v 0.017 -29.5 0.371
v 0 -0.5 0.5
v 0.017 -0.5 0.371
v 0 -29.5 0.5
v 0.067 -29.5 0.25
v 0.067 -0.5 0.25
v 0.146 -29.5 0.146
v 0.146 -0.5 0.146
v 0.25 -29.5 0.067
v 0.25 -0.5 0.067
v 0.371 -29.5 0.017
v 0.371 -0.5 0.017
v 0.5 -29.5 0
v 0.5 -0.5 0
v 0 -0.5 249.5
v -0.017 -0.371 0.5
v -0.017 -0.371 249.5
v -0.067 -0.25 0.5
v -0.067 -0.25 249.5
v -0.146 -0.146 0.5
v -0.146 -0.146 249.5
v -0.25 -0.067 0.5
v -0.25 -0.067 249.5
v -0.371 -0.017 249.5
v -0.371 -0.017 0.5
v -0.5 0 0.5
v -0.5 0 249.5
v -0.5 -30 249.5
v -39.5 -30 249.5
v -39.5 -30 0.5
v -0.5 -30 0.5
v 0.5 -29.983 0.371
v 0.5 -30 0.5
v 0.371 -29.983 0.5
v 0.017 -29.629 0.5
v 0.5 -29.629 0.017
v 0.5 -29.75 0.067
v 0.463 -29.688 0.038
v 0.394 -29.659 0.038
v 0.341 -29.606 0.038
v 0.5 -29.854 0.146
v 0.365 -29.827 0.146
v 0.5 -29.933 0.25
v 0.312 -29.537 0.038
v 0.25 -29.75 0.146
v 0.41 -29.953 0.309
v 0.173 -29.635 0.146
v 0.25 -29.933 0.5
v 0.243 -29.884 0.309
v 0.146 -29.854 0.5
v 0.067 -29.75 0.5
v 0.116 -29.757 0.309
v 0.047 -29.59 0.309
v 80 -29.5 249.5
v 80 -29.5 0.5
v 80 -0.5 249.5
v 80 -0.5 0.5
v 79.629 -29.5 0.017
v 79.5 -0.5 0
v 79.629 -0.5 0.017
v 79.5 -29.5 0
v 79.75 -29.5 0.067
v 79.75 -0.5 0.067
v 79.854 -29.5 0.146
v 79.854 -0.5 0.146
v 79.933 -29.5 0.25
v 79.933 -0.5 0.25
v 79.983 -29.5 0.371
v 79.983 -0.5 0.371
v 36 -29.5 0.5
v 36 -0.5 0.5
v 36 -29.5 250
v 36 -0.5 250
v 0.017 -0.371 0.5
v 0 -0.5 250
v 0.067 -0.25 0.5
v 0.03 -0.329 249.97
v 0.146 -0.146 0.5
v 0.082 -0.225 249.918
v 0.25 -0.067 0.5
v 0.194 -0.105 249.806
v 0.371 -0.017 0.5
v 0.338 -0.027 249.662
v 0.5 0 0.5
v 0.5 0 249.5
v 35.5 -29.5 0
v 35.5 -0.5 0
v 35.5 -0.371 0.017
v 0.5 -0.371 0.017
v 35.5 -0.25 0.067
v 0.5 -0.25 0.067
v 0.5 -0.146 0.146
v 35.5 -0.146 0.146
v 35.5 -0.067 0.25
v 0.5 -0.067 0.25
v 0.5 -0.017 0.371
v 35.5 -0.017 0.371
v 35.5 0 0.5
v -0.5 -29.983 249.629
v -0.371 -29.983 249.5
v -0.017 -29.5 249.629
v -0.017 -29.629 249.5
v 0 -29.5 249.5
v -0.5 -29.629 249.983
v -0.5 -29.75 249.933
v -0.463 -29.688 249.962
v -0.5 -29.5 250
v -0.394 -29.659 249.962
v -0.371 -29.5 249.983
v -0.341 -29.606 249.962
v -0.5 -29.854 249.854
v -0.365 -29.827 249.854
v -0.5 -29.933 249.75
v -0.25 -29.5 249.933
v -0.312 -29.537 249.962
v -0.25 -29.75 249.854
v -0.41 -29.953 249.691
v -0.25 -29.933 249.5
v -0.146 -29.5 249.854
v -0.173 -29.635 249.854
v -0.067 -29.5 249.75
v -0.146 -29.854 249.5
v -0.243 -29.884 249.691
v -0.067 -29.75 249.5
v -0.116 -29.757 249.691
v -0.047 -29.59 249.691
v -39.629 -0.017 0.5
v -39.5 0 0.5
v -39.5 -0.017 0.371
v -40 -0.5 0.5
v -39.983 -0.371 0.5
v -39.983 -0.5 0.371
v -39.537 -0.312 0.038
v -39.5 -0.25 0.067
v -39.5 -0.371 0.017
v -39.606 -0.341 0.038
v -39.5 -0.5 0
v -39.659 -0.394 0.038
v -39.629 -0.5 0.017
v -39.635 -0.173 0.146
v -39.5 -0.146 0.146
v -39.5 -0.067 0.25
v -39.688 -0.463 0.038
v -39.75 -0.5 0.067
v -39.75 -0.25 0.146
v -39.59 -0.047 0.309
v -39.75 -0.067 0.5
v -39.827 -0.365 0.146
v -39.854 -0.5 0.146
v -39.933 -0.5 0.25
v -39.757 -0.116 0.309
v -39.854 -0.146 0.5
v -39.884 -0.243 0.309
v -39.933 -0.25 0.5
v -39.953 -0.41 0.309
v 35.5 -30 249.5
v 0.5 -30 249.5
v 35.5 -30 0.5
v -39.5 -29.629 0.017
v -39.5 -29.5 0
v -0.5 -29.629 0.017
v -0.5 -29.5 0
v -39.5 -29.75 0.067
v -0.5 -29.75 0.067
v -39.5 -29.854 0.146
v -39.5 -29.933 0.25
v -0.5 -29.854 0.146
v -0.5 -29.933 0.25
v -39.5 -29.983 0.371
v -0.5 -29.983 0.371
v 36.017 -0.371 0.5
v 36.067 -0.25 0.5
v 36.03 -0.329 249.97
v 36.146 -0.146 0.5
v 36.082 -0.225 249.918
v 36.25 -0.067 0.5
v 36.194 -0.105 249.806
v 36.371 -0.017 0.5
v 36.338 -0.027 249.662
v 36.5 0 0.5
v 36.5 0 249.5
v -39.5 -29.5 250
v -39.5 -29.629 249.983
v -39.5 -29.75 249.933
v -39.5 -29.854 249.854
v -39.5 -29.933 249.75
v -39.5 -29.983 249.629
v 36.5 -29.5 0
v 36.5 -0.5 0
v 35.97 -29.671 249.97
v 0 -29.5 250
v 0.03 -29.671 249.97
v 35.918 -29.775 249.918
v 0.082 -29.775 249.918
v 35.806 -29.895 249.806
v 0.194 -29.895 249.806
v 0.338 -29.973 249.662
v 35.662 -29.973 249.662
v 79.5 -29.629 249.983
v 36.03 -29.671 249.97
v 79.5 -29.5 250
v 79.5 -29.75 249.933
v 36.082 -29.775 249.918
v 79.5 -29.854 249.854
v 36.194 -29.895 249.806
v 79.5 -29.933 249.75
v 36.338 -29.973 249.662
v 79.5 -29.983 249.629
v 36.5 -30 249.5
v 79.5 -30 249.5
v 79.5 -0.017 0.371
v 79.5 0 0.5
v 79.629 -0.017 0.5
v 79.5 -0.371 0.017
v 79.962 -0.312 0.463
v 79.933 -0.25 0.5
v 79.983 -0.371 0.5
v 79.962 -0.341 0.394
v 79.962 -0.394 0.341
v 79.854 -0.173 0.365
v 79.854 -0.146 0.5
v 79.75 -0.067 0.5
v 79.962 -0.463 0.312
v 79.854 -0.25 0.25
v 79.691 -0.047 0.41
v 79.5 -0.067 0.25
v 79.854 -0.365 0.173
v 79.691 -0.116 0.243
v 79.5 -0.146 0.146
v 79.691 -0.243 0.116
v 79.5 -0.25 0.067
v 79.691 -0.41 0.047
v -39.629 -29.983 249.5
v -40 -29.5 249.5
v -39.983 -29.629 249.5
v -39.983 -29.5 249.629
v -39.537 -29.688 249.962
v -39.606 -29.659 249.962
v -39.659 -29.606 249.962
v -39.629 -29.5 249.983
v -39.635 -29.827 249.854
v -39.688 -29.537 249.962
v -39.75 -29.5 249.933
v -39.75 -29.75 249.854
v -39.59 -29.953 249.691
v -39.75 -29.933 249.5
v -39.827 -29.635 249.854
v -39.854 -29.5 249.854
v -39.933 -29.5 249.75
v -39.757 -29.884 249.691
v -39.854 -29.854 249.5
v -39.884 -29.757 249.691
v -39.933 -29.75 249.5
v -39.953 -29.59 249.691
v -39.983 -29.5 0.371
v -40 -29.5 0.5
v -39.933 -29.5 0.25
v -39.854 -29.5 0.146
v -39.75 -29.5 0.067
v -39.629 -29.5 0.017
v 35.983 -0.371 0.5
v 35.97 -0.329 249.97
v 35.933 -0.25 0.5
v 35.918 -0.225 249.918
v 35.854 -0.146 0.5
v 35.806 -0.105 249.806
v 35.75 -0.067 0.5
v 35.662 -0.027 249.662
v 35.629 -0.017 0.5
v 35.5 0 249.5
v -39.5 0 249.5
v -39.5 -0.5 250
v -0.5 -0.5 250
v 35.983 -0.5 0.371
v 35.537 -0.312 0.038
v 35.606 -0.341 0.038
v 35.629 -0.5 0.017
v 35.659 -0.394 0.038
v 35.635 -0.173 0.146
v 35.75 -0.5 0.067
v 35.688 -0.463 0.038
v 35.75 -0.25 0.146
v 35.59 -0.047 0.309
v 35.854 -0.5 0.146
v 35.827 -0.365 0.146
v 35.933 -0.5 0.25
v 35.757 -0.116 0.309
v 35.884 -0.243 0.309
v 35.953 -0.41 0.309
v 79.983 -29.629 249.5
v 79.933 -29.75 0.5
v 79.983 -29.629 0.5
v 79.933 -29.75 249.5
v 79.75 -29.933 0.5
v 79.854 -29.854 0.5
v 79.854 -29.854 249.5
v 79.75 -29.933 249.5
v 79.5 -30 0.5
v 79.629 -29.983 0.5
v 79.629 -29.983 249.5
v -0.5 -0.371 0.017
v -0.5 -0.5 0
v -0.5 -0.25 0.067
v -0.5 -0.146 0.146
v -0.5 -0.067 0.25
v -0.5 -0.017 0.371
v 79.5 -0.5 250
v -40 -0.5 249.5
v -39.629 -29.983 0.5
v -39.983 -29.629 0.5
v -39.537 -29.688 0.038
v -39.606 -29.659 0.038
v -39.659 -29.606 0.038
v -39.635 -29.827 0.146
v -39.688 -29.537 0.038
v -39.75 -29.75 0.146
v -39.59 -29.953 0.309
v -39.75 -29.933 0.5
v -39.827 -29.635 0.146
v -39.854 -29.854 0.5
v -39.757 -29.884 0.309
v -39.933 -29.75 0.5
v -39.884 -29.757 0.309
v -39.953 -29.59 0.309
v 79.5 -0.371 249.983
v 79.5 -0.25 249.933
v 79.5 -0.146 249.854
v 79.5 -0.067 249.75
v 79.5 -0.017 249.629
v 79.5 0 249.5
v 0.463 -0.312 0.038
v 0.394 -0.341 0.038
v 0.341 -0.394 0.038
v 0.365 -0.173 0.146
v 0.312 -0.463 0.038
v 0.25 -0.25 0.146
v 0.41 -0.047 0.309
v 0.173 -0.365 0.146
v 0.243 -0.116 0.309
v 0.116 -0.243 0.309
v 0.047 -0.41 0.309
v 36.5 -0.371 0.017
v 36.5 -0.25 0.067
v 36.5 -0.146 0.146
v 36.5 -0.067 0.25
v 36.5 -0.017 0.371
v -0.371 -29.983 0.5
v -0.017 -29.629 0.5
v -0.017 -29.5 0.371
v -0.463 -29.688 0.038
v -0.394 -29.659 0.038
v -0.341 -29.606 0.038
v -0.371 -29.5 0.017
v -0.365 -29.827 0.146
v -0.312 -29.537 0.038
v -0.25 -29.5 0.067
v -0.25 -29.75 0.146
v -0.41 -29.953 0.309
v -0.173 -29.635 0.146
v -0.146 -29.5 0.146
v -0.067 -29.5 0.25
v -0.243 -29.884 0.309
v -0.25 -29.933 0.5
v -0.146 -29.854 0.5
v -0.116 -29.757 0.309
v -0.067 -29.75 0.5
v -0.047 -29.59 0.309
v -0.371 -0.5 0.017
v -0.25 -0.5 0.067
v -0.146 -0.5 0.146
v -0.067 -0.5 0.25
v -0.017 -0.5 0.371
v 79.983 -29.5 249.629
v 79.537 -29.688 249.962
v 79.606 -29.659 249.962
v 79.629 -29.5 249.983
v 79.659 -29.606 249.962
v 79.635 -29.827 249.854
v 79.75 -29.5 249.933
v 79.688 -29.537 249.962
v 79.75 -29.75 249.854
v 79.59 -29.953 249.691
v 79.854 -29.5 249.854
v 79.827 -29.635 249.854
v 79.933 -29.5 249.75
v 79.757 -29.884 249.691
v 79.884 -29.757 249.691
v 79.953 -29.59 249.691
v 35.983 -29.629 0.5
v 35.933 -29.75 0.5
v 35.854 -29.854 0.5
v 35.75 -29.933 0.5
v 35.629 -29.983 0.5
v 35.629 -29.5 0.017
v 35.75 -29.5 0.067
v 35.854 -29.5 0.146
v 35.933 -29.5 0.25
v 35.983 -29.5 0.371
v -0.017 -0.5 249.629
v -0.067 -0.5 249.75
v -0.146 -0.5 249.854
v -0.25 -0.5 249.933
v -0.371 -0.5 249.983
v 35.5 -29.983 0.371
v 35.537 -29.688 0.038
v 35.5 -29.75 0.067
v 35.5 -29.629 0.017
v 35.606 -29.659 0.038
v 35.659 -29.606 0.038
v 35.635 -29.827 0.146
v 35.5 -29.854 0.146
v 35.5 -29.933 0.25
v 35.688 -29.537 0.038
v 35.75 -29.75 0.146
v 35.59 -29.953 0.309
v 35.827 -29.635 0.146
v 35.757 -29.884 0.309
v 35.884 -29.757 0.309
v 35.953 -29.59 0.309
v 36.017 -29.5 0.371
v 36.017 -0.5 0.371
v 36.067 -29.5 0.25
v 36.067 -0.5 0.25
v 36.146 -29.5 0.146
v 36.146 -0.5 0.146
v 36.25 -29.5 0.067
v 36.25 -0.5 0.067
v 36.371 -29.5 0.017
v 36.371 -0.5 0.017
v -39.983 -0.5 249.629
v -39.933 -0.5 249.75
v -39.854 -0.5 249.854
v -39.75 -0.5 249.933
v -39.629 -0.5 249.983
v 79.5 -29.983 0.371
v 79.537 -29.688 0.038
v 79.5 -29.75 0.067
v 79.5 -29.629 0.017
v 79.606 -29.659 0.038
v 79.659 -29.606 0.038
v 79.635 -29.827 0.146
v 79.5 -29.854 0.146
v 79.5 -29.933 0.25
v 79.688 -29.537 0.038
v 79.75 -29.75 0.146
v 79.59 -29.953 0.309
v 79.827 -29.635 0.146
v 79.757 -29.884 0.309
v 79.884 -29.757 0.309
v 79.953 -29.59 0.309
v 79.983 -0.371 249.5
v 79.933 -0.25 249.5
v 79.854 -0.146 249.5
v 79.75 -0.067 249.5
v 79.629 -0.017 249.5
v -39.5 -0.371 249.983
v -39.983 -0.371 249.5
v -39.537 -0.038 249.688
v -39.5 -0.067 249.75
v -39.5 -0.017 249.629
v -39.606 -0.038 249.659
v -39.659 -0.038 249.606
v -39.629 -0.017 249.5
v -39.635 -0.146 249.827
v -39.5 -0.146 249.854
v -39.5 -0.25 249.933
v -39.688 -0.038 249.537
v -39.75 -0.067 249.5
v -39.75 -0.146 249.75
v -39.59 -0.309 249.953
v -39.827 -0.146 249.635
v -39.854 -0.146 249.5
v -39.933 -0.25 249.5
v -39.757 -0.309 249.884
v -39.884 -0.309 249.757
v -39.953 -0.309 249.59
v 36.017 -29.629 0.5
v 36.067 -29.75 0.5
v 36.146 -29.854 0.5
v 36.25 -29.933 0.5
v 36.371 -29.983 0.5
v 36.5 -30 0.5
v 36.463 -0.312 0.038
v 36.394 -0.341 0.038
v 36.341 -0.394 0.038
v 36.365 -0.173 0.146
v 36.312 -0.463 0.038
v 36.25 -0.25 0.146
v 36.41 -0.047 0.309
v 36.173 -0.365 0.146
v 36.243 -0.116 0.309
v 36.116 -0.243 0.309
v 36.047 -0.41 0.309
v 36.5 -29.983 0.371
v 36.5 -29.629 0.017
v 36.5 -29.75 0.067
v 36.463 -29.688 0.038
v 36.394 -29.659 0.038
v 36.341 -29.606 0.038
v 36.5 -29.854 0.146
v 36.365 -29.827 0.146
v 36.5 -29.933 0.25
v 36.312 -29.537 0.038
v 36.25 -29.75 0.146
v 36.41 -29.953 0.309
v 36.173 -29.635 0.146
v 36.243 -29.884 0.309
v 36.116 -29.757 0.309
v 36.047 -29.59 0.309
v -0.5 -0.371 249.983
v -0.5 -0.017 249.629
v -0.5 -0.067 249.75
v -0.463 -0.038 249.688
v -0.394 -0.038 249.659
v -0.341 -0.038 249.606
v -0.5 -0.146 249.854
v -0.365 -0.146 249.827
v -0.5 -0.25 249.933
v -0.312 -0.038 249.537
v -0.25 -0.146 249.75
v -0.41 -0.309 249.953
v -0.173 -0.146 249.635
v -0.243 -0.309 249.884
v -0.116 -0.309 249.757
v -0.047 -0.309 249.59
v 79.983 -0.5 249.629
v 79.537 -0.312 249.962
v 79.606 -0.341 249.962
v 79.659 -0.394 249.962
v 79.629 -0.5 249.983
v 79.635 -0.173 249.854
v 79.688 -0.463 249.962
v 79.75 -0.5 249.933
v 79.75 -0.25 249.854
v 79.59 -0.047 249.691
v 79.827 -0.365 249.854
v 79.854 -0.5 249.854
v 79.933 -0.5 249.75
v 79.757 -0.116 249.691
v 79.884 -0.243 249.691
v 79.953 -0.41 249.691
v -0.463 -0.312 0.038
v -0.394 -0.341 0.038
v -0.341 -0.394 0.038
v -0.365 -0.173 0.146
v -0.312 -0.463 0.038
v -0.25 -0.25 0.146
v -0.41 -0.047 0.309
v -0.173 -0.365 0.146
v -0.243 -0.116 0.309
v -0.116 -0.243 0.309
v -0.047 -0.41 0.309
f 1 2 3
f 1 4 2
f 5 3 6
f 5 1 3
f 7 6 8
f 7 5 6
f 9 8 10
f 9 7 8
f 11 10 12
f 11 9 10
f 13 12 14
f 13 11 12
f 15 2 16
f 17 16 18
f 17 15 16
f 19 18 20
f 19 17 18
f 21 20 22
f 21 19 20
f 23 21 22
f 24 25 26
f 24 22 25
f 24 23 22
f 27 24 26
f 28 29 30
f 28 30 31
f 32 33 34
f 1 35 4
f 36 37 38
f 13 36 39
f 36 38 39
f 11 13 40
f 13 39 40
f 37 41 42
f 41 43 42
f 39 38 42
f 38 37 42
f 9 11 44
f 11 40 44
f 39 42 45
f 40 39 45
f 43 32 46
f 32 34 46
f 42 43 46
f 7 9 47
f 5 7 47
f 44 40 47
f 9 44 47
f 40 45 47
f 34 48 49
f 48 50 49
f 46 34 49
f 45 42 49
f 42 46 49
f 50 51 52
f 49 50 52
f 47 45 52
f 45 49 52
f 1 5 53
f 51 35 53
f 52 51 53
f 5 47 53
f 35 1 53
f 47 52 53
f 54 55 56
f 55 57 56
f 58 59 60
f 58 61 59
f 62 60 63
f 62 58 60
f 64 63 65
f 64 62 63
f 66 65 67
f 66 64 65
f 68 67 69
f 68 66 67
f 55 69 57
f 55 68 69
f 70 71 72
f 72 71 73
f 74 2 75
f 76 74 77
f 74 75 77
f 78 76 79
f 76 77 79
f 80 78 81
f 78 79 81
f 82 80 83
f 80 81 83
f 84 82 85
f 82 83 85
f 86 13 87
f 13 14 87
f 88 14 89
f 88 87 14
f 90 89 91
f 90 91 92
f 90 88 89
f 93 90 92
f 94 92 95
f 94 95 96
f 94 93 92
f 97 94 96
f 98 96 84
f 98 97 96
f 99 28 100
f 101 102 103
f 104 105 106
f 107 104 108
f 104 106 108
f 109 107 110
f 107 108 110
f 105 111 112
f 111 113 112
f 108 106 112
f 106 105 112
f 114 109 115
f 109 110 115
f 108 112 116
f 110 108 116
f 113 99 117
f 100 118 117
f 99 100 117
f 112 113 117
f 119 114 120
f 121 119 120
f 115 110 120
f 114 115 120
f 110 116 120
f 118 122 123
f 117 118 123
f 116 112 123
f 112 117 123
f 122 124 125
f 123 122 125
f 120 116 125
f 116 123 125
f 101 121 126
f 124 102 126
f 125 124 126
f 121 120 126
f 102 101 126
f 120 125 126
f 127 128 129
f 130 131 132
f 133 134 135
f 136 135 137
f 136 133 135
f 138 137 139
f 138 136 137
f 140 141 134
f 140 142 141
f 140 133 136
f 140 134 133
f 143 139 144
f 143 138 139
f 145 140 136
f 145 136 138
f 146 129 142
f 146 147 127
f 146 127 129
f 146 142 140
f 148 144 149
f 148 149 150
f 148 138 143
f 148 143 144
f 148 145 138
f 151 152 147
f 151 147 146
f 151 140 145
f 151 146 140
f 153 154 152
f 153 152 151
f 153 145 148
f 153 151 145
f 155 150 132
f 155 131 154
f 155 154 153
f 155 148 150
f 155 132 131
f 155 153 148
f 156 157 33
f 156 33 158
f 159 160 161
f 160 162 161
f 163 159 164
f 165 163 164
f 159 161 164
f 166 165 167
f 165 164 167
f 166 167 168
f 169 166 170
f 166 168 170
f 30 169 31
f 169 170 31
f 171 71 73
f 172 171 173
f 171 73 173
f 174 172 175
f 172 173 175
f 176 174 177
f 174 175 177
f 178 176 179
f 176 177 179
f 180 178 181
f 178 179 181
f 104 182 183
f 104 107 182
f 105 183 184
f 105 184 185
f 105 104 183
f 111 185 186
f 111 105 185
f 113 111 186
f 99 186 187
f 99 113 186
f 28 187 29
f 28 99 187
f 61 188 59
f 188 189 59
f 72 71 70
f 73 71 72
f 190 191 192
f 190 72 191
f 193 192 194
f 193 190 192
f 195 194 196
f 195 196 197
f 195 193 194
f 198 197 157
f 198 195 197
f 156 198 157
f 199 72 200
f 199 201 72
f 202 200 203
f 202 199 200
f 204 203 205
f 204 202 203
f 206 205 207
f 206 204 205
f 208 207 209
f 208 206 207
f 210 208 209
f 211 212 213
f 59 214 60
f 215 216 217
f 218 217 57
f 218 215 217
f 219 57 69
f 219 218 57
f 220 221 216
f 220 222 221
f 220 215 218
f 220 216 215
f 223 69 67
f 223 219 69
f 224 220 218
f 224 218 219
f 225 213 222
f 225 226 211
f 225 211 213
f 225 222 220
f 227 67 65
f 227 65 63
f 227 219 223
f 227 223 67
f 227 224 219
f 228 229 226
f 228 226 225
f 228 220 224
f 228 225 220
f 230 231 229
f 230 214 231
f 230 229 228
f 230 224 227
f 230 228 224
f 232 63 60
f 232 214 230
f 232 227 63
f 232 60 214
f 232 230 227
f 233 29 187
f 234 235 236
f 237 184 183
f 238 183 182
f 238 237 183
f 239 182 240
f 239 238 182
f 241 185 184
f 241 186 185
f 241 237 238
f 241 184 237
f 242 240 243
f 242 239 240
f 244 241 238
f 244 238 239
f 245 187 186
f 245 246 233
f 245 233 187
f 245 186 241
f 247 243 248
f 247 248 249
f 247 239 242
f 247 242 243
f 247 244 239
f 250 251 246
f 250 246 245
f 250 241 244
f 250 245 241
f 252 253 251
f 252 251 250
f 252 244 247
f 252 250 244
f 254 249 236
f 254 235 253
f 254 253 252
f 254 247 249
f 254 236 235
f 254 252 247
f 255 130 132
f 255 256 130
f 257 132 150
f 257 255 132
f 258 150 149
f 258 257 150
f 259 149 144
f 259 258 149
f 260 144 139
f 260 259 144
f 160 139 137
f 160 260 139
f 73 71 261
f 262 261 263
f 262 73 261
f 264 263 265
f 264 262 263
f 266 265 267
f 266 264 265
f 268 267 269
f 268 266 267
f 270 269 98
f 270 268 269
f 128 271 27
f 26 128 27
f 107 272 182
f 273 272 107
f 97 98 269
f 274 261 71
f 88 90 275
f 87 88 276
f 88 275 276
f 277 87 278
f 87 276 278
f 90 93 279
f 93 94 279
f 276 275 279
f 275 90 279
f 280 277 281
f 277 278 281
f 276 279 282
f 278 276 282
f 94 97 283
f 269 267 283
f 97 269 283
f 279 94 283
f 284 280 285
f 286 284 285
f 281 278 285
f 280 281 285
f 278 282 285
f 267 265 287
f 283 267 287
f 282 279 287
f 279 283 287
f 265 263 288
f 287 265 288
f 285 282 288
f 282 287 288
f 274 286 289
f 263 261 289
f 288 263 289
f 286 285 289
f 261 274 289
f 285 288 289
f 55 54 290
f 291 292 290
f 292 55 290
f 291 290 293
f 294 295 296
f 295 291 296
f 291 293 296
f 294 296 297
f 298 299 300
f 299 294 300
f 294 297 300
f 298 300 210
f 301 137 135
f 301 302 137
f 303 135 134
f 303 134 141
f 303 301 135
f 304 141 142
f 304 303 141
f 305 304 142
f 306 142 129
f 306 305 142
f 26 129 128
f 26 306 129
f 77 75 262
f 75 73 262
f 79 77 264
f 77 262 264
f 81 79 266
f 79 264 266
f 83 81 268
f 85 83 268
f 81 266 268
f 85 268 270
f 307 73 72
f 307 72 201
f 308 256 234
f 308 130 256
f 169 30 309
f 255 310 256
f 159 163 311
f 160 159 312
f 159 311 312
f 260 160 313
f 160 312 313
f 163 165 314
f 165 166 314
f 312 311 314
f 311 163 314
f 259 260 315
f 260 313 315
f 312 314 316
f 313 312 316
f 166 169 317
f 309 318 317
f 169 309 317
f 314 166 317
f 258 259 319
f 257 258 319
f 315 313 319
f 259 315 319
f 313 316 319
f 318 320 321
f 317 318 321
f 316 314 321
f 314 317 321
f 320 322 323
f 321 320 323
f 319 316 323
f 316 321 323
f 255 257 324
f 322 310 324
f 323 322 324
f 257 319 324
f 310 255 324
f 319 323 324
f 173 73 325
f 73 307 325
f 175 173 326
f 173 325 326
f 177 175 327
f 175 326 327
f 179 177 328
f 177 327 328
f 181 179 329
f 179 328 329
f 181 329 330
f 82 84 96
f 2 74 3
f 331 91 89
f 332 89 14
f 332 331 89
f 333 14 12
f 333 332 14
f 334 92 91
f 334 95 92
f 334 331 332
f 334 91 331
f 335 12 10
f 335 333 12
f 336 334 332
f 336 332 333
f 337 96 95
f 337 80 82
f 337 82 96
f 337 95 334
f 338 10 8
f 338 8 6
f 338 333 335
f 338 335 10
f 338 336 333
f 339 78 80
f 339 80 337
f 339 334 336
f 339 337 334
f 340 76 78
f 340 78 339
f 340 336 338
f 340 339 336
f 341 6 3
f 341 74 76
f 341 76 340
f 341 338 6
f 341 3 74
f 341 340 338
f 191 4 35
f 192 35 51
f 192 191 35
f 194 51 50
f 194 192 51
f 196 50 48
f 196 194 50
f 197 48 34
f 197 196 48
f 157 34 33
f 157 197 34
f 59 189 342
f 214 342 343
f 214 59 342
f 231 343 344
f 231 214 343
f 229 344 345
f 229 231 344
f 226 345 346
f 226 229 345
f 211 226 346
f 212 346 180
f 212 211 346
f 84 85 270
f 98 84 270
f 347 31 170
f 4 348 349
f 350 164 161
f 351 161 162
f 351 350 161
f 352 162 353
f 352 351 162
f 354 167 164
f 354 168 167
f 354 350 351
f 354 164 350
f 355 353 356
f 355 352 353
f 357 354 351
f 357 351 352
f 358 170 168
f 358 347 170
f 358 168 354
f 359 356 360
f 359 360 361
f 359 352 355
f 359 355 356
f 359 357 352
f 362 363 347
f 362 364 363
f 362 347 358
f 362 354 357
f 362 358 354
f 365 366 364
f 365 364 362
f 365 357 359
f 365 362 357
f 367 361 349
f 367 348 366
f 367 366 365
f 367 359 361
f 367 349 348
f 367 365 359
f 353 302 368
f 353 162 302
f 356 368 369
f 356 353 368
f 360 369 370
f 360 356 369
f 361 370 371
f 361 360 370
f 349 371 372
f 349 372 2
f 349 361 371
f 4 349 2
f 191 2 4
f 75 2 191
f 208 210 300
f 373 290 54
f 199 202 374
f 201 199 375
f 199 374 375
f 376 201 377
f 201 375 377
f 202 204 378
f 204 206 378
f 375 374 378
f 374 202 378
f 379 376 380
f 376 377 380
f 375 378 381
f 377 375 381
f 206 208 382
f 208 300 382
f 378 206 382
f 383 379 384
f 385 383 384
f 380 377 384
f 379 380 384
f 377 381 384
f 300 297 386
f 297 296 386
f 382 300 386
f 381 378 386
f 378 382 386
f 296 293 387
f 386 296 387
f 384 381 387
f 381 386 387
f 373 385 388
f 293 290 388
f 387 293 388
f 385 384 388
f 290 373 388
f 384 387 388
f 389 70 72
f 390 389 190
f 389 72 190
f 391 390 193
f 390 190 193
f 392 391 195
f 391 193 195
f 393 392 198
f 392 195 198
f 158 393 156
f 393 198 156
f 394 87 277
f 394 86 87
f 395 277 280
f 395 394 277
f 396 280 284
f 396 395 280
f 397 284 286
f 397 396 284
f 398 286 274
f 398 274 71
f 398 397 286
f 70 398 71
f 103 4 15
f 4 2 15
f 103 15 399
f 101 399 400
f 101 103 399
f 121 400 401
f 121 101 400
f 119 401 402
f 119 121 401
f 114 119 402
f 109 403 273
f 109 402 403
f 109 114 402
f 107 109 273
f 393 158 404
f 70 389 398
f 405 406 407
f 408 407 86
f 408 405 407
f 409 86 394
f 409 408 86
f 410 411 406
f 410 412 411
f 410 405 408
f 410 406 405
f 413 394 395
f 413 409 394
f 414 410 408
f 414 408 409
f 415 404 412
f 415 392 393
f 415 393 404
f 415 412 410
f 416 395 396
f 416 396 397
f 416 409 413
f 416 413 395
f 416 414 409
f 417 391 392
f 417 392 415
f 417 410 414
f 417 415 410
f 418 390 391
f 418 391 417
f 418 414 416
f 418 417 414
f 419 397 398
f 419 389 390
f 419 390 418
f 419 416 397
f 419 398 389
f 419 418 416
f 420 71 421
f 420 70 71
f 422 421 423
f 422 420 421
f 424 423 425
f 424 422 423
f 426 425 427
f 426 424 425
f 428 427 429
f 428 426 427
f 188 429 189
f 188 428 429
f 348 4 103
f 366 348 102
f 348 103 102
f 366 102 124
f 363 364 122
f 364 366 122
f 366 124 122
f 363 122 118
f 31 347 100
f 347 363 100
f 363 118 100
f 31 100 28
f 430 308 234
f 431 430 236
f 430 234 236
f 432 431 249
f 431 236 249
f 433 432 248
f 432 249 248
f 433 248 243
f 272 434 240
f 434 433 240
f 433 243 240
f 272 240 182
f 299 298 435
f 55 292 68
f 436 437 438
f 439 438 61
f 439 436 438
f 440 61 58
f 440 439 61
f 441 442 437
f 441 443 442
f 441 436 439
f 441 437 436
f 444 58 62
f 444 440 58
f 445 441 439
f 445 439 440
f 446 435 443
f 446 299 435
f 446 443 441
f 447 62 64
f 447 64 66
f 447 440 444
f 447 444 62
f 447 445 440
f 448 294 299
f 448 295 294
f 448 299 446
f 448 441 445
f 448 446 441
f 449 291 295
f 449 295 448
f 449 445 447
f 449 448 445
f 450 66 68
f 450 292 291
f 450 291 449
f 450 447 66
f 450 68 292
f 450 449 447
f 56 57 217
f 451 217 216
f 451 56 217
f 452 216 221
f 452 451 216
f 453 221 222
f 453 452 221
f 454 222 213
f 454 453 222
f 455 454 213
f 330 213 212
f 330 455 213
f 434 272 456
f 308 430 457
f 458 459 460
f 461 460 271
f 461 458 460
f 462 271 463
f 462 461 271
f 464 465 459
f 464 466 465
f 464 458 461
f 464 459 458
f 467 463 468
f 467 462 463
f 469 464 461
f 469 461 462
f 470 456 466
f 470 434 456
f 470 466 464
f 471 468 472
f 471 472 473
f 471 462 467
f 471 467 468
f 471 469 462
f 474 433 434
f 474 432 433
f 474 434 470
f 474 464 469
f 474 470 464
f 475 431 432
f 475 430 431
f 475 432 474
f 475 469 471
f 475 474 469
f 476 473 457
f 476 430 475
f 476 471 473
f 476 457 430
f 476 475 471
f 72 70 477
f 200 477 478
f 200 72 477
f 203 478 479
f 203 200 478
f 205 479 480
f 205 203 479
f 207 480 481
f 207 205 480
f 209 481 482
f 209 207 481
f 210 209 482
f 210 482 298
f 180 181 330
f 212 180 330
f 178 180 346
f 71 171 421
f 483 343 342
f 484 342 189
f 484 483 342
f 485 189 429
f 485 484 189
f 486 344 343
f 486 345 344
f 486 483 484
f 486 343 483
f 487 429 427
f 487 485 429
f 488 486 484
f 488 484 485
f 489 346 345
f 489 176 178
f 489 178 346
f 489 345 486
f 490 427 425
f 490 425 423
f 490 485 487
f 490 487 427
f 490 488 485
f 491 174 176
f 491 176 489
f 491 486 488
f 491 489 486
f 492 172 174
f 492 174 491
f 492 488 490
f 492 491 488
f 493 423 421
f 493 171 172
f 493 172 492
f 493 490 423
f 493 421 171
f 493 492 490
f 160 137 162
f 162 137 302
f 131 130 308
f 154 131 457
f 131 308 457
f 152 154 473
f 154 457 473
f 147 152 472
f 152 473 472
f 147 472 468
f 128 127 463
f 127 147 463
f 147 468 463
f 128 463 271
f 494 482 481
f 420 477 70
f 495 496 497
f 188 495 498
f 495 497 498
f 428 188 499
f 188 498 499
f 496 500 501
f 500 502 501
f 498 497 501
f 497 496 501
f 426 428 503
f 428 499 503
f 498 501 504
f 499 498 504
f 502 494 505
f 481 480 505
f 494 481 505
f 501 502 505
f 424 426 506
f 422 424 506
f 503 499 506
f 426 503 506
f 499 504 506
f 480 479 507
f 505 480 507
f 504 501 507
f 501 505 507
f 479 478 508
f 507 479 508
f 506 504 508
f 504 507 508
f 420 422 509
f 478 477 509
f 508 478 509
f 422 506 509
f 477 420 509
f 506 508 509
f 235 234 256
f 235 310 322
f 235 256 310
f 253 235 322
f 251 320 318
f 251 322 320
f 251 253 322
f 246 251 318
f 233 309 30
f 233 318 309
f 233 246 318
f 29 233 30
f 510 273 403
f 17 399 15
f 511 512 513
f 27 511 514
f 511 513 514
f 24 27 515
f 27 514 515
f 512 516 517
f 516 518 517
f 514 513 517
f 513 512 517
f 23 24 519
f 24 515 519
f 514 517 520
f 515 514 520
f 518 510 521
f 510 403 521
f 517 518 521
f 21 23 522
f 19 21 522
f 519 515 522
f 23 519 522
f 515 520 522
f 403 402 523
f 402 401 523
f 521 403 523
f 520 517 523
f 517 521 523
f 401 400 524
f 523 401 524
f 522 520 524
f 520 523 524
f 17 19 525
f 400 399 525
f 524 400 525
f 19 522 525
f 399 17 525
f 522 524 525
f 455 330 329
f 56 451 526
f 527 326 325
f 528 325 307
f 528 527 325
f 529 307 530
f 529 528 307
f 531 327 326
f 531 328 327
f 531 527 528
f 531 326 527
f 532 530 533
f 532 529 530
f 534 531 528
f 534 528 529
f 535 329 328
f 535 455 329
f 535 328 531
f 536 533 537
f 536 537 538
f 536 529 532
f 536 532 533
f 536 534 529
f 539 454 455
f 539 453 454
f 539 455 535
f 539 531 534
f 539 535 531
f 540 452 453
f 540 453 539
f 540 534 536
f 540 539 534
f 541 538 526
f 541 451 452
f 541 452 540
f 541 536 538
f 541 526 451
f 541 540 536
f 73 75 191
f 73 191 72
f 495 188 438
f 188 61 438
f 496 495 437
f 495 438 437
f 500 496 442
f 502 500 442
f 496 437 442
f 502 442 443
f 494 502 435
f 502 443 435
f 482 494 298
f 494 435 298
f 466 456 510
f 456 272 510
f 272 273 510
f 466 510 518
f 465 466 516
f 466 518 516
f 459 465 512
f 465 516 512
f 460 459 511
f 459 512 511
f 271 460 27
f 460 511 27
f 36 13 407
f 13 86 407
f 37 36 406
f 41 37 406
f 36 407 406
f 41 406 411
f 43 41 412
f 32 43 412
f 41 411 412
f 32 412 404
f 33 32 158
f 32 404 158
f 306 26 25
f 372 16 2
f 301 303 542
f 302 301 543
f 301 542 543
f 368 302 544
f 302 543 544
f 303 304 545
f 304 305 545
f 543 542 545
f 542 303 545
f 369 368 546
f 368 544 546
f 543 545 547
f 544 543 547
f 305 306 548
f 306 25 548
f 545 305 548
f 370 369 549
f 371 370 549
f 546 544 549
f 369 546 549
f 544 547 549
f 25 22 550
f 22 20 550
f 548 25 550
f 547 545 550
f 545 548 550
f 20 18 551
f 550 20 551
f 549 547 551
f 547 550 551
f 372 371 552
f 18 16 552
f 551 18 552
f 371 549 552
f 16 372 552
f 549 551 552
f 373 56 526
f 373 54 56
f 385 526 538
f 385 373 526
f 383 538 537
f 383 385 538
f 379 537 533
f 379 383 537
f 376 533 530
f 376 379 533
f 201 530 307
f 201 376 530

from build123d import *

# Parameters (mm, degrees)
F0_W     = 40
F0_H     = 250
F3_DEPTH = 30
F1_W     = 36
F1_H     = 250
F4_DEPTH = 30
F2_W     = 44
F2_H     = 250
F5_DEPTH = 30
F6_R     = 0.5
F6_2_R   = 0.5
F6_3_R   = 0.5


with BuildPart() as f3:
    # F0 (on Front) → F3 (new body)
    with BuildSketch(Plane.XZ):
        with Locations((-20, 125)):
            Rectangle(F0_W, F0_H)
    extrude(amount=F3_DEPTH)

    # F6#3
    f6_3_edges = [f3.edges().sort_by_distance(p)[0] for p in [
        (0, -30, 125),
        (-40, -30, 125),
        (-20, -30, 0),
        (-20, -30, 250),
        (0, -15, 250),
        (-40, -15, 250),
        (-20, 0, 250),
        (0, 0, 125),
        (-40, 0, 125),
        (-20, 0, 0),
        (-40, -15, 0),
        (0, -15, 0),
    ]]
    fillet(f6_3_edges, radius=F6_3_R)


with BuildPart() as f4:
    # F1 (on Front) → F4 (new body)
    with BuildSketch(Plane.XZ):
        with Locations((18, 125)):
            Rectangle(F1_W, F1_H)
    extrude(amount=F4_DEPTH)

    # F6#2
    f6_2_edges = [f4.edges().sort_by_distance(p)[0] for p in [
        (36, -30, 125),
        (0, -30, 125),
        (18, -30, 0),
        (18, -30, 250),
        (36, 0, 125),
        (0, 0, 125),
        (18, 0, 0),
        (18, 0, 250),
        (36, -15, 0),
        (0, -15, 0),
    ]]
    fillet(f6_2_edges, radius=F6_2_R)


with BuildPart() as f5:
    # F2 (on Front) → F5 (new body)
    with BuildSketch(Plane.XZ):
        with Locations((58, 125)):
            Rectangle(F2_W, F2_H)
    extrude(amount=F5_DEPTH)

    # F6
    f6_edges = [f5.edges().sort_by_distance(p)[0] for p in [
        (80, -30, 125),
        (36, -30, 125),
        (58, -30, 0),
        (58, -30, 250),
        (36, 0, 125),
        (58, 0, 0),
        (80, 0, 125),
        (58, 0, 250),
        (80, -15, 0),
        (80, -15, 250),
        (36, -15, 0),
    ]]
    fillet(f6_edges, radius=F6_R)


solid = Compound([f3.part, f4.part, f5.part])
